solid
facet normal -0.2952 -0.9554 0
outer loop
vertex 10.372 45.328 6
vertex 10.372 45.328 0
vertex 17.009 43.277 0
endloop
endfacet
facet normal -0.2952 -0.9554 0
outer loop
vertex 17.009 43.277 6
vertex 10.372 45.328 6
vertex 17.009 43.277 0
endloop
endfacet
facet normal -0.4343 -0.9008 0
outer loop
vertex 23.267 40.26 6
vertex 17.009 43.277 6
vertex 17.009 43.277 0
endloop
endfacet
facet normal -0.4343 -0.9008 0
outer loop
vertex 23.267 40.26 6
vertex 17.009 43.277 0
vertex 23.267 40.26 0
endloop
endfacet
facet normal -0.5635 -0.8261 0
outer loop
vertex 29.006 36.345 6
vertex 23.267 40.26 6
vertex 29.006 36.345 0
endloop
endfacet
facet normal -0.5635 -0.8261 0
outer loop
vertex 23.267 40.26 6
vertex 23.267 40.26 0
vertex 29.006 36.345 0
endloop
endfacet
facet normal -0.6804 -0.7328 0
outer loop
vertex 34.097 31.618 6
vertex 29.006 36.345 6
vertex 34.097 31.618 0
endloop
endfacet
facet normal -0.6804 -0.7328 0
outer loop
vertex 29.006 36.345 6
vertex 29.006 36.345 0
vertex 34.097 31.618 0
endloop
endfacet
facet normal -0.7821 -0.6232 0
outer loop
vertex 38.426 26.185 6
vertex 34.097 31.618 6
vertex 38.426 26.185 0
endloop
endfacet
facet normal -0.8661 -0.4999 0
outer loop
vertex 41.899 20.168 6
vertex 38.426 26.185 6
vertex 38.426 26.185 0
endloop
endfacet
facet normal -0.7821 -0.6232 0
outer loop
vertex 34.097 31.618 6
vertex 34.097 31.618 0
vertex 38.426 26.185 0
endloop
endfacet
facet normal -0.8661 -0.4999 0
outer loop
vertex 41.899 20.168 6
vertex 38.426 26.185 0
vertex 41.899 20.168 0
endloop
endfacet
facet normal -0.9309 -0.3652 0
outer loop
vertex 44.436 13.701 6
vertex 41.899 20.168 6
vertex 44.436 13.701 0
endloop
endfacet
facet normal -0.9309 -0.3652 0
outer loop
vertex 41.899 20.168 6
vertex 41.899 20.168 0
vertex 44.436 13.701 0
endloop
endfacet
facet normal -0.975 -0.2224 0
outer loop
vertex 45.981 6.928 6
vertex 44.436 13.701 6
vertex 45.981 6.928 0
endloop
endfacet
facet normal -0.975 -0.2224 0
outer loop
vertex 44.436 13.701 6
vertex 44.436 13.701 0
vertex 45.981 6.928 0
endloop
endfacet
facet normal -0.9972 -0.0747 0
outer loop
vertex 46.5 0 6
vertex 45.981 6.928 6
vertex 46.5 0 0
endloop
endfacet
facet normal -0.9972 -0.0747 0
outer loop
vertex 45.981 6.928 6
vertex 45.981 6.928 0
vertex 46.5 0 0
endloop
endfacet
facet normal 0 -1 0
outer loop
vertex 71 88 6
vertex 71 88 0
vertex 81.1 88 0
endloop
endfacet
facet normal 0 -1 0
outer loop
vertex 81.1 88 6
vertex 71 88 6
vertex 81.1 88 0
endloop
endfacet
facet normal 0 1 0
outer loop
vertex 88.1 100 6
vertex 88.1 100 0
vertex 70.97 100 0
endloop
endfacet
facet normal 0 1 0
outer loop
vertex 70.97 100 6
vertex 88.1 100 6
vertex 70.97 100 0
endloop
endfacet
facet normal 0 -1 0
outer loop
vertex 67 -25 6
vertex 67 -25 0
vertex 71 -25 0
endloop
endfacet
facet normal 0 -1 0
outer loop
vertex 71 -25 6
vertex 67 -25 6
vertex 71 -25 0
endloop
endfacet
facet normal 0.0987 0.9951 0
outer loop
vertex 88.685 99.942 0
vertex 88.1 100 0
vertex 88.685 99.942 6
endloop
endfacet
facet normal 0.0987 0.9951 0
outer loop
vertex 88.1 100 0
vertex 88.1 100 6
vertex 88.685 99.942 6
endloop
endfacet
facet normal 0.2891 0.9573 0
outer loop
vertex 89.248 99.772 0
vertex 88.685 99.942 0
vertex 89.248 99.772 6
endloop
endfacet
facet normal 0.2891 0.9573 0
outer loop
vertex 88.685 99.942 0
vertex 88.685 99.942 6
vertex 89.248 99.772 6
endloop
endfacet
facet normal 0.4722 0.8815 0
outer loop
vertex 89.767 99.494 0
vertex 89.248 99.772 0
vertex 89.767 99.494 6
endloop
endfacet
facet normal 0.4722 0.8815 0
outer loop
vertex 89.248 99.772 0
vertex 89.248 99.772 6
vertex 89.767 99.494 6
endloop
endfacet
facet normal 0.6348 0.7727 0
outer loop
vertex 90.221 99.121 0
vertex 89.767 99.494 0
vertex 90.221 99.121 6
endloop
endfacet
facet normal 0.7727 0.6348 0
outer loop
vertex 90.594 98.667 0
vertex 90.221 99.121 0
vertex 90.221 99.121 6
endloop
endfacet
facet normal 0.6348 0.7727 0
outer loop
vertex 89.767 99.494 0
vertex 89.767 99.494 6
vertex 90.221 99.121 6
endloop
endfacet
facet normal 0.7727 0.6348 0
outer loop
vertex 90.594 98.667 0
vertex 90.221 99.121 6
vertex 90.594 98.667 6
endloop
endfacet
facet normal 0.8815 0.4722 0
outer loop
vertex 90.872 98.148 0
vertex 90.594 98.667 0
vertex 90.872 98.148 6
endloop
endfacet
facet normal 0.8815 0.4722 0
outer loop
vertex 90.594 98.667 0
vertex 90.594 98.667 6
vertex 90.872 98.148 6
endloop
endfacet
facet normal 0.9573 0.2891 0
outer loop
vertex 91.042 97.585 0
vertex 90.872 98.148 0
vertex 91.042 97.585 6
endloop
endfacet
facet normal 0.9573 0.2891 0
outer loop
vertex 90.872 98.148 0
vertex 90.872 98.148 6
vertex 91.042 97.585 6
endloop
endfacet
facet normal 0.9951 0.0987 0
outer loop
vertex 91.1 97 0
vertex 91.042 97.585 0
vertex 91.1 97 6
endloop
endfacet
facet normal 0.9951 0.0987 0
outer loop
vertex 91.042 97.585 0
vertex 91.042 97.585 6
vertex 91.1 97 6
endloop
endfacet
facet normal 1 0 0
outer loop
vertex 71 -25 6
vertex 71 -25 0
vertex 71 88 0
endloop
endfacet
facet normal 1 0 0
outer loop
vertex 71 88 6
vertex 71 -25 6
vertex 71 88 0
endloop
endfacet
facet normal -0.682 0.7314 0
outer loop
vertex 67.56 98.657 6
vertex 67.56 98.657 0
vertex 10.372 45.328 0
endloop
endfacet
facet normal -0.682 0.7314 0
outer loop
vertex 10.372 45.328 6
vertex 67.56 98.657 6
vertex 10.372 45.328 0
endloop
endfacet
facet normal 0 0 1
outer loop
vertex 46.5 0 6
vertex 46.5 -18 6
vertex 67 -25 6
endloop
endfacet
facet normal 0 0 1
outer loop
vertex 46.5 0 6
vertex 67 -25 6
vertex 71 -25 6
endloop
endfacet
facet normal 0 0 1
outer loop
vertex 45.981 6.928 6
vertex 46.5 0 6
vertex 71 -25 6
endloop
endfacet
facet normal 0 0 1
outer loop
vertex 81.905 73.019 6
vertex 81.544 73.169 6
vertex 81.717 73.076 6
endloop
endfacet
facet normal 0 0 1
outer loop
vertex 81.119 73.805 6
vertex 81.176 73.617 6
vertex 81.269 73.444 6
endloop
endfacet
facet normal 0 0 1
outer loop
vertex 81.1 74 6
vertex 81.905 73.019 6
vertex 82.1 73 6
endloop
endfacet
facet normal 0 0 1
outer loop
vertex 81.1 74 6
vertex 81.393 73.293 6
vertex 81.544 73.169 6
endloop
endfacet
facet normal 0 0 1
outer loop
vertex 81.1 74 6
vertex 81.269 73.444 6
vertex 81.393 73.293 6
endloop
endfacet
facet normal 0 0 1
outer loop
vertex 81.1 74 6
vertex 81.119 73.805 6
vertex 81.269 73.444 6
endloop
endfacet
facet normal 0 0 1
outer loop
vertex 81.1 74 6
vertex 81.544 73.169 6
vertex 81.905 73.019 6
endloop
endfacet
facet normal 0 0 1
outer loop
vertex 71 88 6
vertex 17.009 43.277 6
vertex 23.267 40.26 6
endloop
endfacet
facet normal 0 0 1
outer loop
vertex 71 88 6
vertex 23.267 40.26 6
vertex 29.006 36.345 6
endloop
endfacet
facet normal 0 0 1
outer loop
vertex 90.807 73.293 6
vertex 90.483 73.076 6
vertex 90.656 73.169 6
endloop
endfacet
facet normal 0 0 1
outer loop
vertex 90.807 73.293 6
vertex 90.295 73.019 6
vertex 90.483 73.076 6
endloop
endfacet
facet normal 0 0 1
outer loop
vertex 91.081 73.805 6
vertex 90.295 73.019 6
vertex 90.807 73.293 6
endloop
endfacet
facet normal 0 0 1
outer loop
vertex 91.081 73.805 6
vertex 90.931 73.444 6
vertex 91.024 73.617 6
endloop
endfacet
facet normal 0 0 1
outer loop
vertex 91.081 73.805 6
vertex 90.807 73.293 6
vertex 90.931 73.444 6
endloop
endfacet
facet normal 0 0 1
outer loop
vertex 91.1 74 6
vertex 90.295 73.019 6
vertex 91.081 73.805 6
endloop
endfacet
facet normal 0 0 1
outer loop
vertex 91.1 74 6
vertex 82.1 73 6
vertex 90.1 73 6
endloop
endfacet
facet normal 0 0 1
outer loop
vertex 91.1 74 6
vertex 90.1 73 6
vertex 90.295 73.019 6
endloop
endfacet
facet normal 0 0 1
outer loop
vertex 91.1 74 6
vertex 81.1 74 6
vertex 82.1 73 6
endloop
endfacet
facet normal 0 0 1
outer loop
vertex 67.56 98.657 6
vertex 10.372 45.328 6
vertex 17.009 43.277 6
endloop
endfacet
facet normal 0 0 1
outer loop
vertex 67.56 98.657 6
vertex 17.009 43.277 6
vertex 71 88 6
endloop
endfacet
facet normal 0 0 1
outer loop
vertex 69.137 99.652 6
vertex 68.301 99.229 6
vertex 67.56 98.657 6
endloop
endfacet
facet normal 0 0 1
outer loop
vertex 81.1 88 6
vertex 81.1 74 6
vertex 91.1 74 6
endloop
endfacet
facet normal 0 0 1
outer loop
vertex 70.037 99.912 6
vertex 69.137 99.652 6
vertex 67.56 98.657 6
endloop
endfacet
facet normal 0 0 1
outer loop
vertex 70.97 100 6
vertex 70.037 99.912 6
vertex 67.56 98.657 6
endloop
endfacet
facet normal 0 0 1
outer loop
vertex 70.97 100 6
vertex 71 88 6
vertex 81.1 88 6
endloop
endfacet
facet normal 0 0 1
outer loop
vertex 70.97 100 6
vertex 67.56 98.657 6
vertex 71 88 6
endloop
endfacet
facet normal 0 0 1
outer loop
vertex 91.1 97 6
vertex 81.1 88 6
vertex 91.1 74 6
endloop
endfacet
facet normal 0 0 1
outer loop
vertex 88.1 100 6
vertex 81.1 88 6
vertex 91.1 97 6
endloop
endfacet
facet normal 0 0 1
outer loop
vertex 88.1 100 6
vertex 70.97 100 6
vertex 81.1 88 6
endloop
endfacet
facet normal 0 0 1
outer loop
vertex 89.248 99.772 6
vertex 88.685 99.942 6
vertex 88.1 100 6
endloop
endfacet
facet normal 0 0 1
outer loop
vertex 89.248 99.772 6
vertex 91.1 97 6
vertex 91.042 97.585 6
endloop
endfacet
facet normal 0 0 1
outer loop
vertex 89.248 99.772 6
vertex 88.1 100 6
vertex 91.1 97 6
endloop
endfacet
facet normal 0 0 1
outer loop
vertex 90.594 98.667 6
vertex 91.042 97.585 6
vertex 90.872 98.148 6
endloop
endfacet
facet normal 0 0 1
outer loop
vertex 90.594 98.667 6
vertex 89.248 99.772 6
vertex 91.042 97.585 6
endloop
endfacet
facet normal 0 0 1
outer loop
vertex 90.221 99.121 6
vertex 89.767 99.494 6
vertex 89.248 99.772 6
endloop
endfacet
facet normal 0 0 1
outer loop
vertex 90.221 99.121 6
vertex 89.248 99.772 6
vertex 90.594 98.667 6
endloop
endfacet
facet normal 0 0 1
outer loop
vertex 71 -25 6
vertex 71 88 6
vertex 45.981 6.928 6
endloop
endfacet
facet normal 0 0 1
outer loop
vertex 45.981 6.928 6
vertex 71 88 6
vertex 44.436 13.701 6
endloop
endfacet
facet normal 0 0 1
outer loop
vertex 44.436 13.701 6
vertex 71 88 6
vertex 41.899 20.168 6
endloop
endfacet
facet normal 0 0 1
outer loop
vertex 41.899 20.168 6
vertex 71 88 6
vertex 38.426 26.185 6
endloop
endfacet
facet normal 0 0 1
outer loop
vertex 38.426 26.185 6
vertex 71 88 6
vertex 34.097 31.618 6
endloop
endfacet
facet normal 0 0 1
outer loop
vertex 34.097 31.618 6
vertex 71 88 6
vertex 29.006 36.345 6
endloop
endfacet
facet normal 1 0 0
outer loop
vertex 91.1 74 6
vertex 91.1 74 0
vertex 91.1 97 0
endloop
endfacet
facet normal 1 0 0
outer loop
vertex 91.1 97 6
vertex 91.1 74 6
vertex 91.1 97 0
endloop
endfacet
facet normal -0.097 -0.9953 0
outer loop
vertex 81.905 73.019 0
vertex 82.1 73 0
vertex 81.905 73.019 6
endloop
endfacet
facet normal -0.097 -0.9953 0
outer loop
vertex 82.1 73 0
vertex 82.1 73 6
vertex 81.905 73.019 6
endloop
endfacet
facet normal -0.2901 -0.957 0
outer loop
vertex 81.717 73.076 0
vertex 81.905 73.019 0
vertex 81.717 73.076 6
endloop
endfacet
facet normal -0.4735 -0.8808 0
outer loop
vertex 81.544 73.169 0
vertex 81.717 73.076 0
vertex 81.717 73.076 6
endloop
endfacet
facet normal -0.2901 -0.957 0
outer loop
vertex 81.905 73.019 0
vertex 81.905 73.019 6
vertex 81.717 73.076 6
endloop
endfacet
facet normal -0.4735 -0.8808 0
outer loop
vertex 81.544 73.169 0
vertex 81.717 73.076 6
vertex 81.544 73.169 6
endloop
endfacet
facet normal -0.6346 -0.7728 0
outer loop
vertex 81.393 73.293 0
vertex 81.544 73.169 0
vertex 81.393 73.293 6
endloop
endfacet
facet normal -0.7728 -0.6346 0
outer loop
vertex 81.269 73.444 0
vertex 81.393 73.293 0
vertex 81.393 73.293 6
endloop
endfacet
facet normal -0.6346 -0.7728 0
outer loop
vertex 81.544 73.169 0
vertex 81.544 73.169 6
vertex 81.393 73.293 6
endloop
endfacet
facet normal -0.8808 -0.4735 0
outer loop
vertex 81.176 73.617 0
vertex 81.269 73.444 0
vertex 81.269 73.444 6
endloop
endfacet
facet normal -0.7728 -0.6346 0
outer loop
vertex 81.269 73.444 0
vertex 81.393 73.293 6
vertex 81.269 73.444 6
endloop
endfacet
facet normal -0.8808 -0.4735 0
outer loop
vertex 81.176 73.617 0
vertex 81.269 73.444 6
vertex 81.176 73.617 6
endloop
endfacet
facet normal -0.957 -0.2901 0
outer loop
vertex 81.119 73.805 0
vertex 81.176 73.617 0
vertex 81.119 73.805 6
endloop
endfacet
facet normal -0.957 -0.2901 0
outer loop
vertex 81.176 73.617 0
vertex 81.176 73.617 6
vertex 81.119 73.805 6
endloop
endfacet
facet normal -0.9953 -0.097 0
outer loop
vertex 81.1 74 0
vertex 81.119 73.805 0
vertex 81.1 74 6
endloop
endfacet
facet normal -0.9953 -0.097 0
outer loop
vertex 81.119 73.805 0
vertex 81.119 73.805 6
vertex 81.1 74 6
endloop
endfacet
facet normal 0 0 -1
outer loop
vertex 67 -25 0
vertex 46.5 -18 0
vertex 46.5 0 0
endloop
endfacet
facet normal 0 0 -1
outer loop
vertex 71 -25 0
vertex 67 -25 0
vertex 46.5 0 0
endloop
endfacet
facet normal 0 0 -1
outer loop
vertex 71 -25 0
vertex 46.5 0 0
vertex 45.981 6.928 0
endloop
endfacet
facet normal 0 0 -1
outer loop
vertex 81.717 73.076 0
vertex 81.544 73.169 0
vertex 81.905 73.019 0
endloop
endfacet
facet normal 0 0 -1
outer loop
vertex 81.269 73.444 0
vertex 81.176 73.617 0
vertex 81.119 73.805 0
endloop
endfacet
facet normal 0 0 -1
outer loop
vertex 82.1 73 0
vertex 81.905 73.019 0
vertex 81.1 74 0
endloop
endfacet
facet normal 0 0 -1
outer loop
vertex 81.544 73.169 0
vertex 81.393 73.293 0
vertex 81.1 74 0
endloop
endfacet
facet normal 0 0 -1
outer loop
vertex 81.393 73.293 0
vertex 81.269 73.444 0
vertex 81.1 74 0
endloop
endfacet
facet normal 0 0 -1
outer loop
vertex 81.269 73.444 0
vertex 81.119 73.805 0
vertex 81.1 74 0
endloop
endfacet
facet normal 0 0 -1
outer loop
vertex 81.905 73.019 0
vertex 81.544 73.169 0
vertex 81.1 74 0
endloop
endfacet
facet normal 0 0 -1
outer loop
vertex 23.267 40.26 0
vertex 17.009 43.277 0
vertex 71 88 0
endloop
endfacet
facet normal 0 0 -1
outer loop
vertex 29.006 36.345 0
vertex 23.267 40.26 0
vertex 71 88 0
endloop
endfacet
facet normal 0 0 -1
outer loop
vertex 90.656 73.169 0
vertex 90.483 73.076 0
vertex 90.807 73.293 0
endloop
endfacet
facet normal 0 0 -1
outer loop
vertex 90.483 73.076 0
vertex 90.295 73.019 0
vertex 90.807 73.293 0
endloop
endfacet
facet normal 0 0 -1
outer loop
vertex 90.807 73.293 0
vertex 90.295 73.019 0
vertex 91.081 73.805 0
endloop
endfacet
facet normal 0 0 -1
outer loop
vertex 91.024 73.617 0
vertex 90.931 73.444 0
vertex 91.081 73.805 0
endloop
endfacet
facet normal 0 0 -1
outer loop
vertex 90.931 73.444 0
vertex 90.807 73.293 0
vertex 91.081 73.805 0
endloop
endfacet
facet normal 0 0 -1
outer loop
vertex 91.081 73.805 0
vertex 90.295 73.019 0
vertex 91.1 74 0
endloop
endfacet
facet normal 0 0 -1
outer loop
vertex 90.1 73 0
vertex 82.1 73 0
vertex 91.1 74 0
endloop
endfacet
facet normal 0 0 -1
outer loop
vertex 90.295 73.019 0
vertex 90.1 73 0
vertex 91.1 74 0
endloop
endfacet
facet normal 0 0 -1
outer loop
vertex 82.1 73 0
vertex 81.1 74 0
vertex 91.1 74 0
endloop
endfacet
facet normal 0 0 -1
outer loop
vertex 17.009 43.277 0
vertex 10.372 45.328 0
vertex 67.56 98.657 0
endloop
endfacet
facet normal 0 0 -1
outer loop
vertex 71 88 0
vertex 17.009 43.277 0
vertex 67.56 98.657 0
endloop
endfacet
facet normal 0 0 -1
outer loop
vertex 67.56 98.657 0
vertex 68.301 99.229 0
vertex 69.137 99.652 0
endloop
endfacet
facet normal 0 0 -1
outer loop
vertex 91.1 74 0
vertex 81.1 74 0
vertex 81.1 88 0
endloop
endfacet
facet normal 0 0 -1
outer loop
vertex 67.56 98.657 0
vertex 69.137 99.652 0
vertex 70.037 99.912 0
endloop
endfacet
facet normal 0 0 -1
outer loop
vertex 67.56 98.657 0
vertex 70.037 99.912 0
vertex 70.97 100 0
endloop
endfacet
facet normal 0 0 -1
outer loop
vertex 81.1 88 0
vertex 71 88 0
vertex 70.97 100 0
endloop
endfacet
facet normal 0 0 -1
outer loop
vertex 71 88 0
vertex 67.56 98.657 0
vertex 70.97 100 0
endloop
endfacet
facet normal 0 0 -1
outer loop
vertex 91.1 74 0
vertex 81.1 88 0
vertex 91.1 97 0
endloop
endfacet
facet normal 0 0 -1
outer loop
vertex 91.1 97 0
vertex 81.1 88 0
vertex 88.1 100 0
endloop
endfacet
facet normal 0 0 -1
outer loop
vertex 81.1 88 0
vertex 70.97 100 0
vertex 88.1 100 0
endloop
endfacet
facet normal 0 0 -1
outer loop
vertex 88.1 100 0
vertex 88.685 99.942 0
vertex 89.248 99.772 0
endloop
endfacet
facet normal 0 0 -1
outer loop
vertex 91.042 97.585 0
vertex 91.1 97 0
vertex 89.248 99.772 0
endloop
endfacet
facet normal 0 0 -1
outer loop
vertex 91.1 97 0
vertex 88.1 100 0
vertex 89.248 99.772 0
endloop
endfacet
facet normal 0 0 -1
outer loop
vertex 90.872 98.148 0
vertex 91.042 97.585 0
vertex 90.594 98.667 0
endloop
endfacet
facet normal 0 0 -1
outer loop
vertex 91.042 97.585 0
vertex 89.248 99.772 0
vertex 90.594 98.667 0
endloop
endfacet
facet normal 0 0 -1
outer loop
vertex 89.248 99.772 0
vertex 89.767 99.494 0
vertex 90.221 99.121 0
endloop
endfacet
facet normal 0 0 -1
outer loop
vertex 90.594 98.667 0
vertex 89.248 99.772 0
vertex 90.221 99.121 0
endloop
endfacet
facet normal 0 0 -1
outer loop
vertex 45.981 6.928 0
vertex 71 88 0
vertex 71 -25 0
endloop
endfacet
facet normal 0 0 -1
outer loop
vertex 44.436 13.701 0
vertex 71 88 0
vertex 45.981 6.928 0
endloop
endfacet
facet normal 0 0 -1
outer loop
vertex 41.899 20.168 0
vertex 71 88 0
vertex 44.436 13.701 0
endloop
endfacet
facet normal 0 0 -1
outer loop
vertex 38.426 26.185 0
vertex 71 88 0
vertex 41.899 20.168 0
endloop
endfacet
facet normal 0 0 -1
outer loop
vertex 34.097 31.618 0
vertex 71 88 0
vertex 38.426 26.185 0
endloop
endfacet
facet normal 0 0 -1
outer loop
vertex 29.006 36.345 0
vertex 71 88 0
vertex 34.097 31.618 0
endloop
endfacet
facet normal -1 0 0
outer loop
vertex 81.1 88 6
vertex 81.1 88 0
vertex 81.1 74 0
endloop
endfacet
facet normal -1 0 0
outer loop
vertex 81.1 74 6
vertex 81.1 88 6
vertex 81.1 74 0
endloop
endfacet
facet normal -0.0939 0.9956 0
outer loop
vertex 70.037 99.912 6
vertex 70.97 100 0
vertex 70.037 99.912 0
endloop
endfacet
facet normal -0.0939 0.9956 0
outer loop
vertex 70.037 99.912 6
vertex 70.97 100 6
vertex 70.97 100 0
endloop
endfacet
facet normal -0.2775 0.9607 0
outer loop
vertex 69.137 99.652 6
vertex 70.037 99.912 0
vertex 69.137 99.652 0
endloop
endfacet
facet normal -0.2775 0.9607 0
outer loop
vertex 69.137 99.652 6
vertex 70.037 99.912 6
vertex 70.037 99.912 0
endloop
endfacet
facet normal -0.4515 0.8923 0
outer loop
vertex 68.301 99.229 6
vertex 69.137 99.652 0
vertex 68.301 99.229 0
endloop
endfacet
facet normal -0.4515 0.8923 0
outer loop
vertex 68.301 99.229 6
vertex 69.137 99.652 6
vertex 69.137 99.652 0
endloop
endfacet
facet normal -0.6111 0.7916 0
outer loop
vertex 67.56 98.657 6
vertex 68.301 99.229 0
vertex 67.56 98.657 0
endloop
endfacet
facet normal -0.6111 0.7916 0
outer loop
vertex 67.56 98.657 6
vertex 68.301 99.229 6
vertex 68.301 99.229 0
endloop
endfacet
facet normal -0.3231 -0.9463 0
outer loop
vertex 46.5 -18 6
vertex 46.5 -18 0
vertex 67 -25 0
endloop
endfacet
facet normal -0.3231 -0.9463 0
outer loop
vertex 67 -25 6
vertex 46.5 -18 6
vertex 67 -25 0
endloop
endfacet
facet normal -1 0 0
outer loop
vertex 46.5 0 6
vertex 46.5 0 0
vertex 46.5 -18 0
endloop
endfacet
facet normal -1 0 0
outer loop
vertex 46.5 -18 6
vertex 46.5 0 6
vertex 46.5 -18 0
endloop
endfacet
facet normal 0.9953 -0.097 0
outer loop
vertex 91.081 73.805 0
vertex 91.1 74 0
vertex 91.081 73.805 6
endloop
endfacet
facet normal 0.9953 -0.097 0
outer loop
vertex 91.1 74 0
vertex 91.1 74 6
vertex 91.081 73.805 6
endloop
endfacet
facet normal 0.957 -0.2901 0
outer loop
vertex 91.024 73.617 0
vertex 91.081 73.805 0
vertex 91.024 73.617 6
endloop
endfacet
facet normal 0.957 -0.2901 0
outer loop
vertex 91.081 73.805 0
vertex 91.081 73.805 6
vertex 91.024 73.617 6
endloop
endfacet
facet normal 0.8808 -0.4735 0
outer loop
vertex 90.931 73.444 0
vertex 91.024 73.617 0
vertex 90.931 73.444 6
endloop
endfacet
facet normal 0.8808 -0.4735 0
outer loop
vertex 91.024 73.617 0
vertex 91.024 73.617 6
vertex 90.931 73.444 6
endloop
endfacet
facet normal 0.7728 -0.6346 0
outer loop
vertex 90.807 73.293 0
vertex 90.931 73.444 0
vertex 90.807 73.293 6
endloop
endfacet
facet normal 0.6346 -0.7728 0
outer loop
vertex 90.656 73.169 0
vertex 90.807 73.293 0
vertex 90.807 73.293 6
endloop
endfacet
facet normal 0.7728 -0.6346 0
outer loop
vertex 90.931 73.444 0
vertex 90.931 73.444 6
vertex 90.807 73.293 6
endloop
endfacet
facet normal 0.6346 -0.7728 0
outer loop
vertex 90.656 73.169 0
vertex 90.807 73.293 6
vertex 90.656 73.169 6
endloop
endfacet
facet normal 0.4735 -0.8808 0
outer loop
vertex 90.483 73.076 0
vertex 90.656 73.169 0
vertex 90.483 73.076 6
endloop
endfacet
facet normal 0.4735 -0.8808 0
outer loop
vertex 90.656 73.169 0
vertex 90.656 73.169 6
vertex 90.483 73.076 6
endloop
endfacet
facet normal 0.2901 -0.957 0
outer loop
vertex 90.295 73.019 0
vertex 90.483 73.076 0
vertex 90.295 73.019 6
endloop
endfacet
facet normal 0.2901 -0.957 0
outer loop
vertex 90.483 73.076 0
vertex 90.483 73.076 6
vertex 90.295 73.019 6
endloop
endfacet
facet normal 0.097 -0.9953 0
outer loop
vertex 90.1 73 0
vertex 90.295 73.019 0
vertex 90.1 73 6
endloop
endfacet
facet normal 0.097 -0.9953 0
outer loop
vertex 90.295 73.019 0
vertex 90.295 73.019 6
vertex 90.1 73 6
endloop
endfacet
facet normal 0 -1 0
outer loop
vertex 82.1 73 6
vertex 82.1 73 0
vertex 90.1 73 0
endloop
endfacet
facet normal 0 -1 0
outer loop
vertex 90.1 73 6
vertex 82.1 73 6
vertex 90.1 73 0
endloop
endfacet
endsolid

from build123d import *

# Parameters (mm, degrees)
BOSS_EXTRU_1_DEPTH = 6
FILLET1_R          = 5
FILLET1_2_R        = 3
FILLET1_3_R        = 1


with BuildPart() as part:
    # Esquisse1 → Boss.-Extru.1 (new body)
    with BuildSketch(Plane.XY):
        with BuildLine():
            Line((46.5, 0), (46.5, -18))
            Line((46.5, -18), (67, -25))
            Line((67, -25), (71, -25))
            Line((71, -25), (71, 88))
            Line((71, 88), (81.1, 88))
            Line((81.1, 88), (81.1, 73))
            Line((81.1, 73), (91.1, 73))
            Line((91.1, 73), (91.1, 100))
            Line((91.1, 100), (69, 100))
            Line((69, 100), (10.371982926, 45.328489608))
            ThreePointArc((10.371982926, 45.328489608), (36.363080219, 28.982346298), (46.5, 0))
        make_face()
    extrude(amount=BOSS_EXTRU_1_DEPTH)

    # Fillet1
    fillet1_edges = [part.edges().sort_by_distance(p)[0] for p in [
        (69, 100, 3),
    ]]
    fillet(fillet1_edges, radius=FILLET1_R)

    # Fillet1 2
    fillet1_2_edges = [part.edges().sort_by_distance(p)[0] for p in [
        (91.1, 100, 3),
    ]]
    fillet(fillet1_2_edges, radius=FILLET1_2_R)

    # Fillet1 3
    fillet1_3_edges = [part.edges().sort_by_distance(p)[0] for p in [
        (91.1, 73, 3),
        (81.1, 73, 3),
    ]]
    fillet(fillet1_3_edges, radius=FILLET1_3_R)


solid = part.part
